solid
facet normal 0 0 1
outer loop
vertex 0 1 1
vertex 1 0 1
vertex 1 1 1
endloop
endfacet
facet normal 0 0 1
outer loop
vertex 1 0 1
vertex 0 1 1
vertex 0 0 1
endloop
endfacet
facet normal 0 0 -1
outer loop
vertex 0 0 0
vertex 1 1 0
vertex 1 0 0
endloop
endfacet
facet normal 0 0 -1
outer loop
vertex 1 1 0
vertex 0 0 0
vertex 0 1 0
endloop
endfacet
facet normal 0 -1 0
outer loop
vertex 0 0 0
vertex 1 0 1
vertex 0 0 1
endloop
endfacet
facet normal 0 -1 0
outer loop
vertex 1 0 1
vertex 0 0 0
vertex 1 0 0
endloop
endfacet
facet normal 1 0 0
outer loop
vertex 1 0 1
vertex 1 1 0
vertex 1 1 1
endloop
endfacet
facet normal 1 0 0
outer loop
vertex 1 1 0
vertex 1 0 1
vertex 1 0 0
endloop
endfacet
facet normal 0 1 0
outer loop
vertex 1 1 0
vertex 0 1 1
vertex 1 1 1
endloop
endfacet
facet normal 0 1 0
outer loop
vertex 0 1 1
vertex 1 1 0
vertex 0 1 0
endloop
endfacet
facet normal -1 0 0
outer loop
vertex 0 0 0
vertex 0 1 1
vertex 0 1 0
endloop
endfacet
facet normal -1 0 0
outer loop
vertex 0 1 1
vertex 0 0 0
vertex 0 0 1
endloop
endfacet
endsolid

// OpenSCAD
// Peristaltic pump stand: a separate mounting plate and two end-panel legs.

set = "plate"; // [plate, legs, assembly]
revision_string = "dev";

// Measured pump dimensions and fit controls.
pump_count = 2;
pump_spacing = 62;
motor_hole_d = 29;
motor_screw_spacing = 48.5;
motor_clearance_h = 55;
mount_hole_d = 5.5;

module plate() {
    cube([1, 1, 1]);
}

module legs() {
    cube([1, 1, 1]);
}

module assembly() {
    plate();
    translate([2, 0, 0]) legs();
}

if (set == "plate") plate();
else if (set == "legs") legs();
else if (set == "assembly") assembly();
